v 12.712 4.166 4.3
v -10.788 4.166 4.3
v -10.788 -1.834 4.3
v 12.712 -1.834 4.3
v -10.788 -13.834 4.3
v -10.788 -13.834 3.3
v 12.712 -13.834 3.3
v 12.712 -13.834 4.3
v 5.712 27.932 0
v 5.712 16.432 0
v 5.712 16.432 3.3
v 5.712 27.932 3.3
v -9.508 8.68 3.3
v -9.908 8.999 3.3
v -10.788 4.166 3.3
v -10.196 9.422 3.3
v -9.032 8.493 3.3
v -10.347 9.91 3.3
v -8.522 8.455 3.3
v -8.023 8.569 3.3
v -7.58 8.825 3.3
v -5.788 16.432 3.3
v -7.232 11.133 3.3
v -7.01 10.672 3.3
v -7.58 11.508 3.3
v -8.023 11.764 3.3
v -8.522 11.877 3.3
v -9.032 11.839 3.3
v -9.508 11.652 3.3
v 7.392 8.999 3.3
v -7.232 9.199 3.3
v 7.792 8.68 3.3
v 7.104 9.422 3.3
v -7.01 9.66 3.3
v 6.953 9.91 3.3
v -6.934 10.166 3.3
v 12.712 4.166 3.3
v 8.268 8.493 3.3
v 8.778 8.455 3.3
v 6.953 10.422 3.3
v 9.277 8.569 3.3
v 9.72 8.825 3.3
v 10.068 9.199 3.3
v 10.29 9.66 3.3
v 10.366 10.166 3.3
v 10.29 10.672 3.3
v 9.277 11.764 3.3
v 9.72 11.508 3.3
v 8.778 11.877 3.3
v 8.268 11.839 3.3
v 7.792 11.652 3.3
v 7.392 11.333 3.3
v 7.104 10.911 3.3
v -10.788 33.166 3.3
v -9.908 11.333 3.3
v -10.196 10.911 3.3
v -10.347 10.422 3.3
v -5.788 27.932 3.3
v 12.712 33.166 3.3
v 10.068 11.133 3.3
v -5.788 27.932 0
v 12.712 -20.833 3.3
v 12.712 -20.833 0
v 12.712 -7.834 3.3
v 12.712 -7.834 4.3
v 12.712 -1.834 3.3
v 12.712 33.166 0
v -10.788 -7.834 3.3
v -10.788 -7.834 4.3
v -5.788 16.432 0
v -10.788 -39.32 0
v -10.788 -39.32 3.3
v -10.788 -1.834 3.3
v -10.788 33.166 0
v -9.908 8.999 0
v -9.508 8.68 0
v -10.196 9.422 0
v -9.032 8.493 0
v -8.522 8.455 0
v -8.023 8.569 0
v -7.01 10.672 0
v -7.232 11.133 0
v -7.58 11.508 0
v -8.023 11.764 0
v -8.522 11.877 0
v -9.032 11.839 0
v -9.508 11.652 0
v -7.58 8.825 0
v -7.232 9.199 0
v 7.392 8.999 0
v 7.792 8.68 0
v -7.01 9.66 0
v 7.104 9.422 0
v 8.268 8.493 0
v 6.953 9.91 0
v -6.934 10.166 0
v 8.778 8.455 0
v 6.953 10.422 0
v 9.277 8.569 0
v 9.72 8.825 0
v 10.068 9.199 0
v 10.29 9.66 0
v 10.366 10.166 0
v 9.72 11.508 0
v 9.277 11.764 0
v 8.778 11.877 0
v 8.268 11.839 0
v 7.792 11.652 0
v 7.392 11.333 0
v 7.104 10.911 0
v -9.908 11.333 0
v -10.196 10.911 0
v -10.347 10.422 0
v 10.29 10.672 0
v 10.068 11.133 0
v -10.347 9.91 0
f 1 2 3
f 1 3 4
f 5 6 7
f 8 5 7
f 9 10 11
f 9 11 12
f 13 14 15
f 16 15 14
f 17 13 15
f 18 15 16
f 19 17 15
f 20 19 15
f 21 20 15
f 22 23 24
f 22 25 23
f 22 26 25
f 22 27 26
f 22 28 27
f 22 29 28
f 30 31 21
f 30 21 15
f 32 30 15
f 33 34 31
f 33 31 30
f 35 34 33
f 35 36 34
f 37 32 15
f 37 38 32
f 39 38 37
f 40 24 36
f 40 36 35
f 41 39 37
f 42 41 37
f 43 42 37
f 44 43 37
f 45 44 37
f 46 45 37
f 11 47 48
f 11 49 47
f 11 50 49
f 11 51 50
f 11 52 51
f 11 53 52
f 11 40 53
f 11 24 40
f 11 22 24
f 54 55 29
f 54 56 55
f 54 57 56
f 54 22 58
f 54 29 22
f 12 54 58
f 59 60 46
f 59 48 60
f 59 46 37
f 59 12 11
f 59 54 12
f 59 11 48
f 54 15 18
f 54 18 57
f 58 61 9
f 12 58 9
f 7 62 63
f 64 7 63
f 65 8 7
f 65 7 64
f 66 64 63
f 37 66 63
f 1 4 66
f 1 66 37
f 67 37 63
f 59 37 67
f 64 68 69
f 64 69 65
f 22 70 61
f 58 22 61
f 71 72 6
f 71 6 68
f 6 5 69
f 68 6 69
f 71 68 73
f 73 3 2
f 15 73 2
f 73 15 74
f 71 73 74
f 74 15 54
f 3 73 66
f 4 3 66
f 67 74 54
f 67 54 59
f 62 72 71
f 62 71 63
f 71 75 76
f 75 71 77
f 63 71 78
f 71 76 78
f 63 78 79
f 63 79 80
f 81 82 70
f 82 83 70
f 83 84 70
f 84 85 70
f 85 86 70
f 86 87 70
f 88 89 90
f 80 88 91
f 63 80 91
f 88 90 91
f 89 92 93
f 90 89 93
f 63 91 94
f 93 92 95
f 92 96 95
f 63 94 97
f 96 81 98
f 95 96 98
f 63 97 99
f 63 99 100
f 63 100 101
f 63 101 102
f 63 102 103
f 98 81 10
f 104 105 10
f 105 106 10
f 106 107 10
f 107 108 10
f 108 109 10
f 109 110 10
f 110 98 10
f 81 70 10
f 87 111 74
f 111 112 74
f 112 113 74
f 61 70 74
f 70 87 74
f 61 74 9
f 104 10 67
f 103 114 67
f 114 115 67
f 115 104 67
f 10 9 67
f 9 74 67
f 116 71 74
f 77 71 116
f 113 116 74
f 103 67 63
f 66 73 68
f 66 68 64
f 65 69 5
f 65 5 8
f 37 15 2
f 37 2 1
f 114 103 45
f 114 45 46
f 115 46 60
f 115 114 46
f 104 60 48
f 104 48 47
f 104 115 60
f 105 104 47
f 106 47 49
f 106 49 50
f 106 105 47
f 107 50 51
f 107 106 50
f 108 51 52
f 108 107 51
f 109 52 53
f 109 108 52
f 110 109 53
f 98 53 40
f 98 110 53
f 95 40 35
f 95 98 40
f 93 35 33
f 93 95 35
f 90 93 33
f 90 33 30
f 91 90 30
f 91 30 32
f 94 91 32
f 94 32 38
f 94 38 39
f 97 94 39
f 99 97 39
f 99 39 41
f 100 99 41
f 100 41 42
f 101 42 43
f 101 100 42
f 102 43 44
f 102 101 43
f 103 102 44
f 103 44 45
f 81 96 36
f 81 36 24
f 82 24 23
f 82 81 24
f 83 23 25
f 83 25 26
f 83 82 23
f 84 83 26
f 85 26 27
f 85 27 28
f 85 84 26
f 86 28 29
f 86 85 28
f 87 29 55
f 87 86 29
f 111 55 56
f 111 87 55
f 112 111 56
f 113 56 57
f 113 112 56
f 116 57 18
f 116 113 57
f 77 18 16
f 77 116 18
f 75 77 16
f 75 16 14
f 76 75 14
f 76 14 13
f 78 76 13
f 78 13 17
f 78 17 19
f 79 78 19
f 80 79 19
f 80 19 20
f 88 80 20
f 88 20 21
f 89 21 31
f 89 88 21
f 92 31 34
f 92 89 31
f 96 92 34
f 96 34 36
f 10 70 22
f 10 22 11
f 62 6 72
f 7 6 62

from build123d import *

# Parameters (mm, degrees)
SKETCH_1_W          = 30.50790567
SKETCH_1_H          = 76
SKETCH_1_R          = 1.716069694
SKETCH_1_W_2        = 11.5
SKETCH_1_H_2        = 11.5
SKETCH_1_W_3        = 24.50790567
SKETCH_1_H_3        = 19
EXTRUDE_1_DEPTH     = 3.3
SKETCH_2_W          = 30.50790567
SKETCH_2_H          = 6
EXTRUDE_2_DEPTH     = 1
EXTRUDE_3_DEPTH     = 3.3
CUT_EXTRUDE_1_DEPTH = 3.3
SKETCH_8_W          = 30.50790567
SKETCH_8_H          = 29
EXTRUDE_5_DEPTH     = 3.3
CUT_EXTRUDE_3_DEPTH = 3.3
SKETCH_12_W         = 4.466233575
SKETCH_12_H         = 76.29690536
SKETCH_12_W_2       = 3.912291759
SKETCH_12_H_2       = 55.852177881
CUT_EXTRUDE_6_DEPTH = 11.3


with BuildPart() as part:
    # 草圖1 → 填料-伸長1 (new body)
    with BuildSketch(Plane.XY):
        with Locations((0, -4.833822083)):
            Rectangle(SKETCH_1_W, SKETCH_1_H)
        with Locations((-8.65, 10.166177917)):
            Circle(SKETCH_1_R, mode=Mode.SUBTRACT)
        with Locations((-0.03771926, 22.181861337)):
            Rectangle(SKETCH_1_W_2, SKETCH_1_H_2, mode=Mode.SUBTRACT)
        with Locations((8.65, 10.166177917)):
            Circle(SKETCH_1_R, mode=Mode.SUBTRACT)
        with Locations((0, -30.333822083)):
            Rectangle(SKETCH_1_W_3, SKETCH_1_H_3, mode=Mode.SUBTRACT)
    extrude(amount=EXTRUDE_1_DEPTH)

    # 草圖2 → 填料-伸長2 (add)
    with BuildSketch(Plane.XY.offset(3.3)):
        with Locations((0, 1.166177917)):
            Rectangle(SKETCH_2_W, SKETCH_2_H)
        with Locations((0, -10.833822083)):
            Rectangle(SKETCH_2_W, SKETCH_2_H)
    extrude(amount=EXTRUDE_2_DEPTH)

    # 草圖3 → 填料-伸長3 (add)
    with BuildSketch(Plane.XY):
        Polygon((15.253952835, -42.833822083), (-15.253952835, -18.474060109), (15.253952835, -18.474060109), align=None)
    extrude(amount=EXTRUDE_3_DEPTH)

    # 草圖4 → 除料-伸長1 (cut)
    with BuildSketch(Plane.XY.offset(3.3)):
        Polygon((15.253952835, -42.833822083), (-15.253952835, -18.806748841), (-15.253952835, -42.833822083), align=None)
    extrude(amount=-CUT_EXTRUDE_1_DEPTH, mode=Mode.SUBTRACT)

    # 草圖8 → 填料-伸長5 (add)
    with BuildSketch(Plane.XY.offset(3.3)):
        with Locations((0, -28.333822083)):
            Rectangle(SKETCH_8_W, SKETCH_8_H)
    extrude(amount=-EXTRUDE_5_DEPTH)

    # 草圖9 → 除料-伸長3 (cut)
    with BuildSketch(Plane.XY.offset(3.3)):
        Polygon((-15.253952835, -42.833822083), (15.253952835, -18.833822083), (15.253952835, -42.833822083), align=None)
    extrude(amount=-CUT_EXTRUDE_3_DEPTH, mode=Mode.SUBTRACT)

    # 草圖12 → 除料-伸長6 (cut)
    with BuildSketch(Plane.XY.offset(4.3)):
        with Locations((-13.020836048, -4.982274763)):
            Rectangle(SKETCH_12_W, SKETCH_12_H)
        with Locations((14.66842662, 5.240088976)):
            Rectangle(SKETCH_12_W_2, SKETCH_12_H_2)
    extrude(amount=-CUT_EXTRUDE_6_DEPTH, mode=Mode.SUBTRACT)


solid = part.part
